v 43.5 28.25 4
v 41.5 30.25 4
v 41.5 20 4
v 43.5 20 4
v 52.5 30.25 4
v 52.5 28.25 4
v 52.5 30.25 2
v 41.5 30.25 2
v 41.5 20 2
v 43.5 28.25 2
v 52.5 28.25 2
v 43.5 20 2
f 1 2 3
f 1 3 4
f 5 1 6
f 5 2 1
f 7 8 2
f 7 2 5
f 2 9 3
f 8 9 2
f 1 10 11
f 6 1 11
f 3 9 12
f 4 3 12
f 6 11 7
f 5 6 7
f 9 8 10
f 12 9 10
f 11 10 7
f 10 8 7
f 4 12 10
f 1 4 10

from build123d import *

# Parameters (mm, degrees)
BOX162_W     = 9
BOX162_H     = 2
BOX162_DEPTH = 2
BOX160_W     = 2
BOX160_H     = 10.25
BOX160_DEPTH = 2


with BuildPart() as cube151:
    # Box162 → Box162 (new body)
    with BuildSketch(Plane(origin=(43.5, 28.25, 2), x_dir=(1, 0, 0), z_dir=(0, 0, 1))):
        with Locations((4.5, 1)):
            Rectangle(BOX162_W, BOX162_H)
    extrude(amount=BOX162_DEPTH)


with BuildPart() as fusion050:
    # Box160 → Box160 (new body)
    with BuildSketch(Plane(origin=(41.5, 20, 2), x_dir=(1, 0, 0), z_dir=(0, 0, 1))):
        with Locations((1, 5.125)):
            Rectangle(BOX160_W, BOX160_H)
    extrude(amount=BOX160_DEPTH)

    # Fusion050: union Cube151
    add(cube151.part)


solid = fusion050.part
